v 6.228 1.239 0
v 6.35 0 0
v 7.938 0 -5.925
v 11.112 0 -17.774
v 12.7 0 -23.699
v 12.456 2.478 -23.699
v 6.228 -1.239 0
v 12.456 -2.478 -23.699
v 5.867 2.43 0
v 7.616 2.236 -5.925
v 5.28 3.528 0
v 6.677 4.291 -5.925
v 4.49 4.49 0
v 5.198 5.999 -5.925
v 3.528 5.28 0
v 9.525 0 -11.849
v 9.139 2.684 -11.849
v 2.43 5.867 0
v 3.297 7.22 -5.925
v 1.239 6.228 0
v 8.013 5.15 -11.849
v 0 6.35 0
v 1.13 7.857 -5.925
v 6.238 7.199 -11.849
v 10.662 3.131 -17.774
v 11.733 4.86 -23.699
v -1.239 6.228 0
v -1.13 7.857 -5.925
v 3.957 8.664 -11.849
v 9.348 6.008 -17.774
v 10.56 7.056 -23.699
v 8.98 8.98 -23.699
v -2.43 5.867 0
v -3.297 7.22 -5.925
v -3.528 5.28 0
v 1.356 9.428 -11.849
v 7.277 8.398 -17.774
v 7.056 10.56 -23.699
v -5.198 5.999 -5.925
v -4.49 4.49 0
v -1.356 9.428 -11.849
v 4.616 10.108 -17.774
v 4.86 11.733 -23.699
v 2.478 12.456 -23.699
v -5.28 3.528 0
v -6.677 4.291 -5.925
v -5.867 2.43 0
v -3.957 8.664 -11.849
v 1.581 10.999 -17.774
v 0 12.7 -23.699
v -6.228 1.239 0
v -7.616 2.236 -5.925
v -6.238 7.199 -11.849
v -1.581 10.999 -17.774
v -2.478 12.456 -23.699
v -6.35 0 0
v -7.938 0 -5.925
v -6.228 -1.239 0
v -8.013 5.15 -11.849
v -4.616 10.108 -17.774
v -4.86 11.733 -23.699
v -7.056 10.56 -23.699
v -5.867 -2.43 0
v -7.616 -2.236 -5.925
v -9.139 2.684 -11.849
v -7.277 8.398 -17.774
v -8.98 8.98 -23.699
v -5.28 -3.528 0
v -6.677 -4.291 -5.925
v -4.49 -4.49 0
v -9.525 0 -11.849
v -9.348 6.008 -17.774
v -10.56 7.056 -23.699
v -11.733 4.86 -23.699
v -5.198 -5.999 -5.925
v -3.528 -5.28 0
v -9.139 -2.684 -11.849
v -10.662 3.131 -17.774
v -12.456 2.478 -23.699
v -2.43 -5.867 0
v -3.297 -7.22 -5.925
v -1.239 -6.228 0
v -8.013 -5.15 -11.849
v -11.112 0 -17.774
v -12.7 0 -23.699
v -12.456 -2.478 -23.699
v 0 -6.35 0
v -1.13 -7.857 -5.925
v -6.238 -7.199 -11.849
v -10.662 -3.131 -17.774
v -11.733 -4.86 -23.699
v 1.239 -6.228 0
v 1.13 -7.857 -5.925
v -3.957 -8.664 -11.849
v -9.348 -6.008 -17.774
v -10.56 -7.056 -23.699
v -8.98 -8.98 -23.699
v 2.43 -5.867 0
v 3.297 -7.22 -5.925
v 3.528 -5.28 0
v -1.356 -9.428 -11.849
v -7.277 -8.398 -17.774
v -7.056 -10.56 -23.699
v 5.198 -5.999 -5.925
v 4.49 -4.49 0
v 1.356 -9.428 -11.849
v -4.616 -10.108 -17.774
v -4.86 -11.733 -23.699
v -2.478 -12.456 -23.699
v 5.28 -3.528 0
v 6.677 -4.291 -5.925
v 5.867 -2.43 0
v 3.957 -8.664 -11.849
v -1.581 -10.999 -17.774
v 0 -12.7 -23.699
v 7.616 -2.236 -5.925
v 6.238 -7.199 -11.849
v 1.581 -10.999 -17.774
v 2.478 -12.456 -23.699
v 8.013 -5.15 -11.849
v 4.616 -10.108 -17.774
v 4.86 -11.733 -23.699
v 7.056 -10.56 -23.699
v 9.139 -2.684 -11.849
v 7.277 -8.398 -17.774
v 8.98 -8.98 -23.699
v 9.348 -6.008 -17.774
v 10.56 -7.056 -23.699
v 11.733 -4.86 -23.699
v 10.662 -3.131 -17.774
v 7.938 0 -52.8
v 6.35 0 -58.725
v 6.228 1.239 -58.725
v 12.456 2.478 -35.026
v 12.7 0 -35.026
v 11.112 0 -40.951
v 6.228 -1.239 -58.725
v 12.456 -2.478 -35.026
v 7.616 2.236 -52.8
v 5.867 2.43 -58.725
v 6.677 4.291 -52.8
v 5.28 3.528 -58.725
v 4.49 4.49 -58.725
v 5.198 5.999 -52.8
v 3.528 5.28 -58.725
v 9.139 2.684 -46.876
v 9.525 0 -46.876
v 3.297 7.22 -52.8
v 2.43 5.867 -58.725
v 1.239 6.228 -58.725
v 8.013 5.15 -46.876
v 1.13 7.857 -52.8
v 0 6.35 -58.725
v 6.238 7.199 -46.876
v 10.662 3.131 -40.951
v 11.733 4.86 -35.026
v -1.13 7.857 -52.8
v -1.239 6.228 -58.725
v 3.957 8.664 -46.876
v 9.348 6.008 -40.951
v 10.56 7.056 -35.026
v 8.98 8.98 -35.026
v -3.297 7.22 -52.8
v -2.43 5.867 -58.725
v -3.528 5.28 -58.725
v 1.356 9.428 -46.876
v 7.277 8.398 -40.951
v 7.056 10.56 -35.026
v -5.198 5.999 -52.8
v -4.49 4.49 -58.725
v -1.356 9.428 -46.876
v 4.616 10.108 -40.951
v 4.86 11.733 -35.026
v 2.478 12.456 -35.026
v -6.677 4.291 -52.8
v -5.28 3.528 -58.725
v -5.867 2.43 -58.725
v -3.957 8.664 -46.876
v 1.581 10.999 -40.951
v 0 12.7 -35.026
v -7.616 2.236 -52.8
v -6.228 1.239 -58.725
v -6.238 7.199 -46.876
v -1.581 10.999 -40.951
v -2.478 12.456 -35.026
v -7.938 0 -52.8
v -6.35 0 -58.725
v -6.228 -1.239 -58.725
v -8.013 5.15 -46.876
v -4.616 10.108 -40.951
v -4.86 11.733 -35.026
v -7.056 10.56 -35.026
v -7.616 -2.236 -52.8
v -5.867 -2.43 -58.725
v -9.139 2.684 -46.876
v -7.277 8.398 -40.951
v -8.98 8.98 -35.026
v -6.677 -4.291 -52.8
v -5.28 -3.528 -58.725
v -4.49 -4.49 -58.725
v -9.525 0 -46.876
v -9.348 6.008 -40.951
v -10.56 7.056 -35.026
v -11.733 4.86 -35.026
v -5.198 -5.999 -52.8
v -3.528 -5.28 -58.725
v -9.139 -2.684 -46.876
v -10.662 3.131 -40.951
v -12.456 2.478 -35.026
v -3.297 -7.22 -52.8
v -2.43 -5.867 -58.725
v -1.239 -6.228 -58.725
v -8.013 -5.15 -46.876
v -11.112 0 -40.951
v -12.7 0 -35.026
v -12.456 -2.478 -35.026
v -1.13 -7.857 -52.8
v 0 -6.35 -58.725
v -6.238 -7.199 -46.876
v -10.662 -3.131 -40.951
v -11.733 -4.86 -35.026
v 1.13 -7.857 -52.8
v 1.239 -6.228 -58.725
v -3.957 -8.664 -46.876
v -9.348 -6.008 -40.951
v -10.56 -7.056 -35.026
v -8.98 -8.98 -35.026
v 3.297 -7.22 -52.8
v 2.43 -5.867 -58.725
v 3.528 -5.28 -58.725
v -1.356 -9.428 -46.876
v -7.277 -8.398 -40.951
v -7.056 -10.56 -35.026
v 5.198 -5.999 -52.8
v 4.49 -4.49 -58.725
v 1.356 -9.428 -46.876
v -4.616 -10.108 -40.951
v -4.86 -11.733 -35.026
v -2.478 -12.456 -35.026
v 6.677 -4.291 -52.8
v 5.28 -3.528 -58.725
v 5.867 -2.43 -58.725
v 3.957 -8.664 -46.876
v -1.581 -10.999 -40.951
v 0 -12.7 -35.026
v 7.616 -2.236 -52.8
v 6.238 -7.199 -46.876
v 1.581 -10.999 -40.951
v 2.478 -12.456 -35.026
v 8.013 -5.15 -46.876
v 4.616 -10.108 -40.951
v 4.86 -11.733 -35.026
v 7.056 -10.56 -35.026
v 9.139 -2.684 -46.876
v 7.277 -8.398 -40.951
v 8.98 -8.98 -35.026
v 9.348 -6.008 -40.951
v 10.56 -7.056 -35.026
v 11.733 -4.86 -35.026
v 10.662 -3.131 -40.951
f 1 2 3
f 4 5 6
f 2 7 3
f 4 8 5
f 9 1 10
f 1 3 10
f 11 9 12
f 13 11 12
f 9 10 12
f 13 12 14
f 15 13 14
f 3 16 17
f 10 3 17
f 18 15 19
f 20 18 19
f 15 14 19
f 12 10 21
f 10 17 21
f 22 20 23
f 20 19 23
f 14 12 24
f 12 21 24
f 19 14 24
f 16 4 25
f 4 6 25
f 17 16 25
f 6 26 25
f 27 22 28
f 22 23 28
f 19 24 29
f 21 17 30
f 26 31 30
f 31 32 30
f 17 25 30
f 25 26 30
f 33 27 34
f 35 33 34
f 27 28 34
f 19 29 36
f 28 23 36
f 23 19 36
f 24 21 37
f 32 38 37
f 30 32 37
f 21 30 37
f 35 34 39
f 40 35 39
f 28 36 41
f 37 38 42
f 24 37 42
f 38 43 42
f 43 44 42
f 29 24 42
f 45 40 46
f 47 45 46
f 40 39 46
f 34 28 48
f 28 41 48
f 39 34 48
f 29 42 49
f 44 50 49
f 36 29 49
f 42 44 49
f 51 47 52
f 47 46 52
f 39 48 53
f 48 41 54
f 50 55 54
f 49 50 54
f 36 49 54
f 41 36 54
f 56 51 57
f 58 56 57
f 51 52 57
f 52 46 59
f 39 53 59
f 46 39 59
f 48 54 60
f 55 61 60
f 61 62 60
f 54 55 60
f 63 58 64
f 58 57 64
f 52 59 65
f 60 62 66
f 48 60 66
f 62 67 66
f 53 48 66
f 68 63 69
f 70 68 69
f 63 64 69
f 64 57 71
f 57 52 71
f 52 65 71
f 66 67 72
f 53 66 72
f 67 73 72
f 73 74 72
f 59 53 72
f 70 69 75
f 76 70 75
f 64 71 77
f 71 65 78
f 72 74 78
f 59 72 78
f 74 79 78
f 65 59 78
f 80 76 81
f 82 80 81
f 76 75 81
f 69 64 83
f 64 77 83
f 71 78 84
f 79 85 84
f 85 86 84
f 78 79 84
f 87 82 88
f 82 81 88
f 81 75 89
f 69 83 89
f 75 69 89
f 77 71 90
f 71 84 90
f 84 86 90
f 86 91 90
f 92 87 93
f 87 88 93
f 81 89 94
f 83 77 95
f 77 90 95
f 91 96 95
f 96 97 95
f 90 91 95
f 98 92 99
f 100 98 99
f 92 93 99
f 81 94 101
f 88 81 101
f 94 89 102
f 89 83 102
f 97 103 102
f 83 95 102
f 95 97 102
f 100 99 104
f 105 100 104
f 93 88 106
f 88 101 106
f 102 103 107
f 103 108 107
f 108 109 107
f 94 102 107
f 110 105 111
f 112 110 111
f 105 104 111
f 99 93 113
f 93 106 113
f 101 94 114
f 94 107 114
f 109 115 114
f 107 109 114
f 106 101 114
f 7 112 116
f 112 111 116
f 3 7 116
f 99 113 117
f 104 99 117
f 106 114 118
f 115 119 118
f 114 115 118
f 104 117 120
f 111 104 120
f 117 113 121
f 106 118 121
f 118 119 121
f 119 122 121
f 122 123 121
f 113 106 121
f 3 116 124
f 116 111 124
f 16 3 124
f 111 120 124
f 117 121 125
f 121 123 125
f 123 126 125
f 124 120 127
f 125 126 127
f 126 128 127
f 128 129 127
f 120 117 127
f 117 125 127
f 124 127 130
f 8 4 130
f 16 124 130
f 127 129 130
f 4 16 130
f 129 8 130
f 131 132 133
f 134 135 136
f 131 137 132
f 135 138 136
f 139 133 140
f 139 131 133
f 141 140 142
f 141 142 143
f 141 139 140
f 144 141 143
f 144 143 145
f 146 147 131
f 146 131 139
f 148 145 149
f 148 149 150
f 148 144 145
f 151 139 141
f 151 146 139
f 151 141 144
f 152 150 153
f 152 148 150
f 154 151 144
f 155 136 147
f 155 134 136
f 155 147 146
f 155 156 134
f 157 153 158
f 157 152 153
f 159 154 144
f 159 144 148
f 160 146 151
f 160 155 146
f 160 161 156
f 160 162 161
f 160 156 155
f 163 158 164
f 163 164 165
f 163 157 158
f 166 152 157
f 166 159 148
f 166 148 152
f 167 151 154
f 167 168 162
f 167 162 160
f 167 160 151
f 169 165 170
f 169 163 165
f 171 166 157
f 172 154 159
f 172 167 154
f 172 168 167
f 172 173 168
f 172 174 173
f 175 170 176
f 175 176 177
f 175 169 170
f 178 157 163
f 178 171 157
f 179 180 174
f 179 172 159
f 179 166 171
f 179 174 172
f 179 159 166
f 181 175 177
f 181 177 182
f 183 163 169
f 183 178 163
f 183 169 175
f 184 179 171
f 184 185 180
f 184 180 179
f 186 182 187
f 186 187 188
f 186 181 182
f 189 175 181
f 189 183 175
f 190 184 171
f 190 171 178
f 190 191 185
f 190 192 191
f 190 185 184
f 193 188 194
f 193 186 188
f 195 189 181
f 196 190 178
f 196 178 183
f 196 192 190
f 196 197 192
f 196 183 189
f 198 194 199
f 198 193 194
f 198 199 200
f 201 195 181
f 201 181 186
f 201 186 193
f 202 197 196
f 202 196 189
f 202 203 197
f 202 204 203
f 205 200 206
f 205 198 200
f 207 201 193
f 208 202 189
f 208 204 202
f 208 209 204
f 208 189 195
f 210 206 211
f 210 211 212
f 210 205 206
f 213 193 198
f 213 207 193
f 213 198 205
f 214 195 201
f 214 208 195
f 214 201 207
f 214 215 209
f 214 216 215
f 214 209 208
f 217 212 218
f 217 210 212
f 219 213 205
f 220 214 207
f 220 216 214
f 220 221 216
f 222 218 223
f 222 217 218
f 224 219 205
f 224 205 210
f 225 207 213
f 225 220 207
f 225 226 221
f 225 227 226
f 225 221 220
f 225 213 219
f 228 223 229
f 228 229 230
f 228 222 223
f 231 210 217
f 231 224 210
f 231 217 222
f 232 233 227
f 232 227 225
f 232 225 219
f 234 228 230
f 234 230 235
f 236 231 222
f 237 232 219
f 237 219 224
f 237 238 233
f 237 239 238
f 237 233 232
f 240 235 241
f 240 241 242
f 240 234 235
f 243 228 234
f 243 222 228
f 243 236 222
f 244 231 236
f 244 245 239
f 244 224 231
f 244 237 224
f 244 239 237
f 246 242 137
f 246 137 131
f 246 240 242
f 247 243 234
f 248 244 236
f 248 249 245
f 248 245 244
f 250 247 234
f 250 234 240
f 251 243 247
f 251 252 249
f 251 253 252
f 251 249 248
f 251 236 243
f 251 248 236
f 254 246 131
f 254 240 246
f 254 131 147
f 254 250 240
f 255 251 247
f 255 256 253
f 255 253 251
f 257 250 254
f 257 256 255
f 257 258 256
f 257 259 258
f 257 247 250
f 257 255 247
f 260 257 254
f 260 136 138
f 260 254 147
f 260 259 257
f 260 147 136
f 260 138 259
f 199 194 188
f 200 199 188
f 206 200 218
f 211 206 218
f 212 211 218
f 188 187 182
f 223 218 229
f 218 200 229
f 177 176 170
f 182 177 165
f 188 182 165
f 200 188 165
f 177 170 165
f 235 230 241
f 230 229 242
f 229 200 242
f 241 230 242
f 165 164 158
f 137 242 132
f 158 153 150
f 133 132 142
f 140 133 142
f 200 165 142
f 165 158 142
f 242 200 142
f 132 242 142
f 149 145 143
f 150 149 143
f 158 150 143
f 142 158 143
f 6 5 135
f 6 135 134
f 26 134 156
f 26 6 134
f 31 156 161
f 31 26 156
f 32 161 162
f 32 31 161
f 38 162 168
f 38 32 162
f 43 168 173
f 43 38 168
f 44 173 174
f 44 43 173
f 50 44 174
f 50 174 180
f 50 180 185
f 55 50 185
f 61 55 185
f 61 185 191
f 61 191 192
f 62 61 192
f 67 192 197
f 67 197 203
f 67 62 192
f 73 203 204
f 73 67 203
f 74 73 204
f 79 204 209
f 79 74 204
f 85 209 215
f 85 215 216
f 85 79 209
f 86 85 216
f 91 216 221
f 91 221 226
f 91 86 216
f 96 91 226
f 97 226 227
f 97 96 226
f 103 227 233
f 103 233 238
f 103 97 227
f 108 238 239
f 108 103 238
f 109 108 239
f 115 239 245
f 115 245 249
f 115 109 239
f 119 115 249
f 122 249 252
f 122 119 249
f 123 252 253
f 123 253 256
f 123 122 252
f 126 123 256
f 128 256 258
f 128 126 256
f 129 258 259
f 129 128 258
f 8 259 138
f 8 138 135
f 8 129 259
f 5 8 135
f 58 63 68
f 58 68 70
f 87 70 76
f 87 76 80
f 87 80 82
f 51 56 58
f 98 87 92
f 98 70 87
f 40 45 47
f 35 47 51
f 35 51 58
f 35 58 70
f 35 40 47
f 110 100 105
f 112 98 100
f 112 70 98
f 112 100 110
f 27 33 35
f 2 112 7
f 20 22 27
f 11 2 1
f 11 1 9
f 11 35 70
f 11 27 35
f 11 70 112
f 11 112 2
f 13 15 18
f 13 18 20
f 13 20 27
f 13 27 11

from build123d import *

# Parameters (mm, degrees)
SKETCH1_R           = 12.7
BOSS_EXTRUDE1_DEPTH = 58.7248
CHAMFER3_SIZE       = 6.35
CHAMFER3_SIZE2      = 23.698522628
CHAMFER4_SIZE       = 6.35
CHAMFER4_SIZE2      = 23.698522628


with BuildPart() as part:
    # Sketch1 → Boss-Extrude1 (new body)
    with BuildSketch(Plane.XY):
        Circle(SKETCH1_R)
    extrude(amount=-BOSS_EXTRUDE1_DEPTH)

    # Chamfer3
    chamfer3_edges = [part.edges().sort_by_distance(p)[0] for p in [
        (-12.7, 0, -58.7248),
    ]]
    chamfer3_side = [part.faces().sort_by_distance(p)[0] for p in [
        (0, 0, -58.7248),
    ]]
    chamfer(chamfer3_edges, length=CHAMFER3_SIZE, length2=CHAMFER3_SIZE2, reference=chamfer3_side[0])

    # Chamfer4
    chamfer4_edges = [part.edges().sort_by_distance(p)[0] for p in [
        (-12.7, 0, 0),
    ]]
    chamfer4_side = [part.faces().sort_by_distance(p)[0] for p in [
        (0, 0, 0),
    ]]
    chamfer(chamfer4_edges, length=CHAMFER4_SIZE, length2=CHAMFER4_SIZE2, reference=chamfer4_side[0])


solid = part.part
